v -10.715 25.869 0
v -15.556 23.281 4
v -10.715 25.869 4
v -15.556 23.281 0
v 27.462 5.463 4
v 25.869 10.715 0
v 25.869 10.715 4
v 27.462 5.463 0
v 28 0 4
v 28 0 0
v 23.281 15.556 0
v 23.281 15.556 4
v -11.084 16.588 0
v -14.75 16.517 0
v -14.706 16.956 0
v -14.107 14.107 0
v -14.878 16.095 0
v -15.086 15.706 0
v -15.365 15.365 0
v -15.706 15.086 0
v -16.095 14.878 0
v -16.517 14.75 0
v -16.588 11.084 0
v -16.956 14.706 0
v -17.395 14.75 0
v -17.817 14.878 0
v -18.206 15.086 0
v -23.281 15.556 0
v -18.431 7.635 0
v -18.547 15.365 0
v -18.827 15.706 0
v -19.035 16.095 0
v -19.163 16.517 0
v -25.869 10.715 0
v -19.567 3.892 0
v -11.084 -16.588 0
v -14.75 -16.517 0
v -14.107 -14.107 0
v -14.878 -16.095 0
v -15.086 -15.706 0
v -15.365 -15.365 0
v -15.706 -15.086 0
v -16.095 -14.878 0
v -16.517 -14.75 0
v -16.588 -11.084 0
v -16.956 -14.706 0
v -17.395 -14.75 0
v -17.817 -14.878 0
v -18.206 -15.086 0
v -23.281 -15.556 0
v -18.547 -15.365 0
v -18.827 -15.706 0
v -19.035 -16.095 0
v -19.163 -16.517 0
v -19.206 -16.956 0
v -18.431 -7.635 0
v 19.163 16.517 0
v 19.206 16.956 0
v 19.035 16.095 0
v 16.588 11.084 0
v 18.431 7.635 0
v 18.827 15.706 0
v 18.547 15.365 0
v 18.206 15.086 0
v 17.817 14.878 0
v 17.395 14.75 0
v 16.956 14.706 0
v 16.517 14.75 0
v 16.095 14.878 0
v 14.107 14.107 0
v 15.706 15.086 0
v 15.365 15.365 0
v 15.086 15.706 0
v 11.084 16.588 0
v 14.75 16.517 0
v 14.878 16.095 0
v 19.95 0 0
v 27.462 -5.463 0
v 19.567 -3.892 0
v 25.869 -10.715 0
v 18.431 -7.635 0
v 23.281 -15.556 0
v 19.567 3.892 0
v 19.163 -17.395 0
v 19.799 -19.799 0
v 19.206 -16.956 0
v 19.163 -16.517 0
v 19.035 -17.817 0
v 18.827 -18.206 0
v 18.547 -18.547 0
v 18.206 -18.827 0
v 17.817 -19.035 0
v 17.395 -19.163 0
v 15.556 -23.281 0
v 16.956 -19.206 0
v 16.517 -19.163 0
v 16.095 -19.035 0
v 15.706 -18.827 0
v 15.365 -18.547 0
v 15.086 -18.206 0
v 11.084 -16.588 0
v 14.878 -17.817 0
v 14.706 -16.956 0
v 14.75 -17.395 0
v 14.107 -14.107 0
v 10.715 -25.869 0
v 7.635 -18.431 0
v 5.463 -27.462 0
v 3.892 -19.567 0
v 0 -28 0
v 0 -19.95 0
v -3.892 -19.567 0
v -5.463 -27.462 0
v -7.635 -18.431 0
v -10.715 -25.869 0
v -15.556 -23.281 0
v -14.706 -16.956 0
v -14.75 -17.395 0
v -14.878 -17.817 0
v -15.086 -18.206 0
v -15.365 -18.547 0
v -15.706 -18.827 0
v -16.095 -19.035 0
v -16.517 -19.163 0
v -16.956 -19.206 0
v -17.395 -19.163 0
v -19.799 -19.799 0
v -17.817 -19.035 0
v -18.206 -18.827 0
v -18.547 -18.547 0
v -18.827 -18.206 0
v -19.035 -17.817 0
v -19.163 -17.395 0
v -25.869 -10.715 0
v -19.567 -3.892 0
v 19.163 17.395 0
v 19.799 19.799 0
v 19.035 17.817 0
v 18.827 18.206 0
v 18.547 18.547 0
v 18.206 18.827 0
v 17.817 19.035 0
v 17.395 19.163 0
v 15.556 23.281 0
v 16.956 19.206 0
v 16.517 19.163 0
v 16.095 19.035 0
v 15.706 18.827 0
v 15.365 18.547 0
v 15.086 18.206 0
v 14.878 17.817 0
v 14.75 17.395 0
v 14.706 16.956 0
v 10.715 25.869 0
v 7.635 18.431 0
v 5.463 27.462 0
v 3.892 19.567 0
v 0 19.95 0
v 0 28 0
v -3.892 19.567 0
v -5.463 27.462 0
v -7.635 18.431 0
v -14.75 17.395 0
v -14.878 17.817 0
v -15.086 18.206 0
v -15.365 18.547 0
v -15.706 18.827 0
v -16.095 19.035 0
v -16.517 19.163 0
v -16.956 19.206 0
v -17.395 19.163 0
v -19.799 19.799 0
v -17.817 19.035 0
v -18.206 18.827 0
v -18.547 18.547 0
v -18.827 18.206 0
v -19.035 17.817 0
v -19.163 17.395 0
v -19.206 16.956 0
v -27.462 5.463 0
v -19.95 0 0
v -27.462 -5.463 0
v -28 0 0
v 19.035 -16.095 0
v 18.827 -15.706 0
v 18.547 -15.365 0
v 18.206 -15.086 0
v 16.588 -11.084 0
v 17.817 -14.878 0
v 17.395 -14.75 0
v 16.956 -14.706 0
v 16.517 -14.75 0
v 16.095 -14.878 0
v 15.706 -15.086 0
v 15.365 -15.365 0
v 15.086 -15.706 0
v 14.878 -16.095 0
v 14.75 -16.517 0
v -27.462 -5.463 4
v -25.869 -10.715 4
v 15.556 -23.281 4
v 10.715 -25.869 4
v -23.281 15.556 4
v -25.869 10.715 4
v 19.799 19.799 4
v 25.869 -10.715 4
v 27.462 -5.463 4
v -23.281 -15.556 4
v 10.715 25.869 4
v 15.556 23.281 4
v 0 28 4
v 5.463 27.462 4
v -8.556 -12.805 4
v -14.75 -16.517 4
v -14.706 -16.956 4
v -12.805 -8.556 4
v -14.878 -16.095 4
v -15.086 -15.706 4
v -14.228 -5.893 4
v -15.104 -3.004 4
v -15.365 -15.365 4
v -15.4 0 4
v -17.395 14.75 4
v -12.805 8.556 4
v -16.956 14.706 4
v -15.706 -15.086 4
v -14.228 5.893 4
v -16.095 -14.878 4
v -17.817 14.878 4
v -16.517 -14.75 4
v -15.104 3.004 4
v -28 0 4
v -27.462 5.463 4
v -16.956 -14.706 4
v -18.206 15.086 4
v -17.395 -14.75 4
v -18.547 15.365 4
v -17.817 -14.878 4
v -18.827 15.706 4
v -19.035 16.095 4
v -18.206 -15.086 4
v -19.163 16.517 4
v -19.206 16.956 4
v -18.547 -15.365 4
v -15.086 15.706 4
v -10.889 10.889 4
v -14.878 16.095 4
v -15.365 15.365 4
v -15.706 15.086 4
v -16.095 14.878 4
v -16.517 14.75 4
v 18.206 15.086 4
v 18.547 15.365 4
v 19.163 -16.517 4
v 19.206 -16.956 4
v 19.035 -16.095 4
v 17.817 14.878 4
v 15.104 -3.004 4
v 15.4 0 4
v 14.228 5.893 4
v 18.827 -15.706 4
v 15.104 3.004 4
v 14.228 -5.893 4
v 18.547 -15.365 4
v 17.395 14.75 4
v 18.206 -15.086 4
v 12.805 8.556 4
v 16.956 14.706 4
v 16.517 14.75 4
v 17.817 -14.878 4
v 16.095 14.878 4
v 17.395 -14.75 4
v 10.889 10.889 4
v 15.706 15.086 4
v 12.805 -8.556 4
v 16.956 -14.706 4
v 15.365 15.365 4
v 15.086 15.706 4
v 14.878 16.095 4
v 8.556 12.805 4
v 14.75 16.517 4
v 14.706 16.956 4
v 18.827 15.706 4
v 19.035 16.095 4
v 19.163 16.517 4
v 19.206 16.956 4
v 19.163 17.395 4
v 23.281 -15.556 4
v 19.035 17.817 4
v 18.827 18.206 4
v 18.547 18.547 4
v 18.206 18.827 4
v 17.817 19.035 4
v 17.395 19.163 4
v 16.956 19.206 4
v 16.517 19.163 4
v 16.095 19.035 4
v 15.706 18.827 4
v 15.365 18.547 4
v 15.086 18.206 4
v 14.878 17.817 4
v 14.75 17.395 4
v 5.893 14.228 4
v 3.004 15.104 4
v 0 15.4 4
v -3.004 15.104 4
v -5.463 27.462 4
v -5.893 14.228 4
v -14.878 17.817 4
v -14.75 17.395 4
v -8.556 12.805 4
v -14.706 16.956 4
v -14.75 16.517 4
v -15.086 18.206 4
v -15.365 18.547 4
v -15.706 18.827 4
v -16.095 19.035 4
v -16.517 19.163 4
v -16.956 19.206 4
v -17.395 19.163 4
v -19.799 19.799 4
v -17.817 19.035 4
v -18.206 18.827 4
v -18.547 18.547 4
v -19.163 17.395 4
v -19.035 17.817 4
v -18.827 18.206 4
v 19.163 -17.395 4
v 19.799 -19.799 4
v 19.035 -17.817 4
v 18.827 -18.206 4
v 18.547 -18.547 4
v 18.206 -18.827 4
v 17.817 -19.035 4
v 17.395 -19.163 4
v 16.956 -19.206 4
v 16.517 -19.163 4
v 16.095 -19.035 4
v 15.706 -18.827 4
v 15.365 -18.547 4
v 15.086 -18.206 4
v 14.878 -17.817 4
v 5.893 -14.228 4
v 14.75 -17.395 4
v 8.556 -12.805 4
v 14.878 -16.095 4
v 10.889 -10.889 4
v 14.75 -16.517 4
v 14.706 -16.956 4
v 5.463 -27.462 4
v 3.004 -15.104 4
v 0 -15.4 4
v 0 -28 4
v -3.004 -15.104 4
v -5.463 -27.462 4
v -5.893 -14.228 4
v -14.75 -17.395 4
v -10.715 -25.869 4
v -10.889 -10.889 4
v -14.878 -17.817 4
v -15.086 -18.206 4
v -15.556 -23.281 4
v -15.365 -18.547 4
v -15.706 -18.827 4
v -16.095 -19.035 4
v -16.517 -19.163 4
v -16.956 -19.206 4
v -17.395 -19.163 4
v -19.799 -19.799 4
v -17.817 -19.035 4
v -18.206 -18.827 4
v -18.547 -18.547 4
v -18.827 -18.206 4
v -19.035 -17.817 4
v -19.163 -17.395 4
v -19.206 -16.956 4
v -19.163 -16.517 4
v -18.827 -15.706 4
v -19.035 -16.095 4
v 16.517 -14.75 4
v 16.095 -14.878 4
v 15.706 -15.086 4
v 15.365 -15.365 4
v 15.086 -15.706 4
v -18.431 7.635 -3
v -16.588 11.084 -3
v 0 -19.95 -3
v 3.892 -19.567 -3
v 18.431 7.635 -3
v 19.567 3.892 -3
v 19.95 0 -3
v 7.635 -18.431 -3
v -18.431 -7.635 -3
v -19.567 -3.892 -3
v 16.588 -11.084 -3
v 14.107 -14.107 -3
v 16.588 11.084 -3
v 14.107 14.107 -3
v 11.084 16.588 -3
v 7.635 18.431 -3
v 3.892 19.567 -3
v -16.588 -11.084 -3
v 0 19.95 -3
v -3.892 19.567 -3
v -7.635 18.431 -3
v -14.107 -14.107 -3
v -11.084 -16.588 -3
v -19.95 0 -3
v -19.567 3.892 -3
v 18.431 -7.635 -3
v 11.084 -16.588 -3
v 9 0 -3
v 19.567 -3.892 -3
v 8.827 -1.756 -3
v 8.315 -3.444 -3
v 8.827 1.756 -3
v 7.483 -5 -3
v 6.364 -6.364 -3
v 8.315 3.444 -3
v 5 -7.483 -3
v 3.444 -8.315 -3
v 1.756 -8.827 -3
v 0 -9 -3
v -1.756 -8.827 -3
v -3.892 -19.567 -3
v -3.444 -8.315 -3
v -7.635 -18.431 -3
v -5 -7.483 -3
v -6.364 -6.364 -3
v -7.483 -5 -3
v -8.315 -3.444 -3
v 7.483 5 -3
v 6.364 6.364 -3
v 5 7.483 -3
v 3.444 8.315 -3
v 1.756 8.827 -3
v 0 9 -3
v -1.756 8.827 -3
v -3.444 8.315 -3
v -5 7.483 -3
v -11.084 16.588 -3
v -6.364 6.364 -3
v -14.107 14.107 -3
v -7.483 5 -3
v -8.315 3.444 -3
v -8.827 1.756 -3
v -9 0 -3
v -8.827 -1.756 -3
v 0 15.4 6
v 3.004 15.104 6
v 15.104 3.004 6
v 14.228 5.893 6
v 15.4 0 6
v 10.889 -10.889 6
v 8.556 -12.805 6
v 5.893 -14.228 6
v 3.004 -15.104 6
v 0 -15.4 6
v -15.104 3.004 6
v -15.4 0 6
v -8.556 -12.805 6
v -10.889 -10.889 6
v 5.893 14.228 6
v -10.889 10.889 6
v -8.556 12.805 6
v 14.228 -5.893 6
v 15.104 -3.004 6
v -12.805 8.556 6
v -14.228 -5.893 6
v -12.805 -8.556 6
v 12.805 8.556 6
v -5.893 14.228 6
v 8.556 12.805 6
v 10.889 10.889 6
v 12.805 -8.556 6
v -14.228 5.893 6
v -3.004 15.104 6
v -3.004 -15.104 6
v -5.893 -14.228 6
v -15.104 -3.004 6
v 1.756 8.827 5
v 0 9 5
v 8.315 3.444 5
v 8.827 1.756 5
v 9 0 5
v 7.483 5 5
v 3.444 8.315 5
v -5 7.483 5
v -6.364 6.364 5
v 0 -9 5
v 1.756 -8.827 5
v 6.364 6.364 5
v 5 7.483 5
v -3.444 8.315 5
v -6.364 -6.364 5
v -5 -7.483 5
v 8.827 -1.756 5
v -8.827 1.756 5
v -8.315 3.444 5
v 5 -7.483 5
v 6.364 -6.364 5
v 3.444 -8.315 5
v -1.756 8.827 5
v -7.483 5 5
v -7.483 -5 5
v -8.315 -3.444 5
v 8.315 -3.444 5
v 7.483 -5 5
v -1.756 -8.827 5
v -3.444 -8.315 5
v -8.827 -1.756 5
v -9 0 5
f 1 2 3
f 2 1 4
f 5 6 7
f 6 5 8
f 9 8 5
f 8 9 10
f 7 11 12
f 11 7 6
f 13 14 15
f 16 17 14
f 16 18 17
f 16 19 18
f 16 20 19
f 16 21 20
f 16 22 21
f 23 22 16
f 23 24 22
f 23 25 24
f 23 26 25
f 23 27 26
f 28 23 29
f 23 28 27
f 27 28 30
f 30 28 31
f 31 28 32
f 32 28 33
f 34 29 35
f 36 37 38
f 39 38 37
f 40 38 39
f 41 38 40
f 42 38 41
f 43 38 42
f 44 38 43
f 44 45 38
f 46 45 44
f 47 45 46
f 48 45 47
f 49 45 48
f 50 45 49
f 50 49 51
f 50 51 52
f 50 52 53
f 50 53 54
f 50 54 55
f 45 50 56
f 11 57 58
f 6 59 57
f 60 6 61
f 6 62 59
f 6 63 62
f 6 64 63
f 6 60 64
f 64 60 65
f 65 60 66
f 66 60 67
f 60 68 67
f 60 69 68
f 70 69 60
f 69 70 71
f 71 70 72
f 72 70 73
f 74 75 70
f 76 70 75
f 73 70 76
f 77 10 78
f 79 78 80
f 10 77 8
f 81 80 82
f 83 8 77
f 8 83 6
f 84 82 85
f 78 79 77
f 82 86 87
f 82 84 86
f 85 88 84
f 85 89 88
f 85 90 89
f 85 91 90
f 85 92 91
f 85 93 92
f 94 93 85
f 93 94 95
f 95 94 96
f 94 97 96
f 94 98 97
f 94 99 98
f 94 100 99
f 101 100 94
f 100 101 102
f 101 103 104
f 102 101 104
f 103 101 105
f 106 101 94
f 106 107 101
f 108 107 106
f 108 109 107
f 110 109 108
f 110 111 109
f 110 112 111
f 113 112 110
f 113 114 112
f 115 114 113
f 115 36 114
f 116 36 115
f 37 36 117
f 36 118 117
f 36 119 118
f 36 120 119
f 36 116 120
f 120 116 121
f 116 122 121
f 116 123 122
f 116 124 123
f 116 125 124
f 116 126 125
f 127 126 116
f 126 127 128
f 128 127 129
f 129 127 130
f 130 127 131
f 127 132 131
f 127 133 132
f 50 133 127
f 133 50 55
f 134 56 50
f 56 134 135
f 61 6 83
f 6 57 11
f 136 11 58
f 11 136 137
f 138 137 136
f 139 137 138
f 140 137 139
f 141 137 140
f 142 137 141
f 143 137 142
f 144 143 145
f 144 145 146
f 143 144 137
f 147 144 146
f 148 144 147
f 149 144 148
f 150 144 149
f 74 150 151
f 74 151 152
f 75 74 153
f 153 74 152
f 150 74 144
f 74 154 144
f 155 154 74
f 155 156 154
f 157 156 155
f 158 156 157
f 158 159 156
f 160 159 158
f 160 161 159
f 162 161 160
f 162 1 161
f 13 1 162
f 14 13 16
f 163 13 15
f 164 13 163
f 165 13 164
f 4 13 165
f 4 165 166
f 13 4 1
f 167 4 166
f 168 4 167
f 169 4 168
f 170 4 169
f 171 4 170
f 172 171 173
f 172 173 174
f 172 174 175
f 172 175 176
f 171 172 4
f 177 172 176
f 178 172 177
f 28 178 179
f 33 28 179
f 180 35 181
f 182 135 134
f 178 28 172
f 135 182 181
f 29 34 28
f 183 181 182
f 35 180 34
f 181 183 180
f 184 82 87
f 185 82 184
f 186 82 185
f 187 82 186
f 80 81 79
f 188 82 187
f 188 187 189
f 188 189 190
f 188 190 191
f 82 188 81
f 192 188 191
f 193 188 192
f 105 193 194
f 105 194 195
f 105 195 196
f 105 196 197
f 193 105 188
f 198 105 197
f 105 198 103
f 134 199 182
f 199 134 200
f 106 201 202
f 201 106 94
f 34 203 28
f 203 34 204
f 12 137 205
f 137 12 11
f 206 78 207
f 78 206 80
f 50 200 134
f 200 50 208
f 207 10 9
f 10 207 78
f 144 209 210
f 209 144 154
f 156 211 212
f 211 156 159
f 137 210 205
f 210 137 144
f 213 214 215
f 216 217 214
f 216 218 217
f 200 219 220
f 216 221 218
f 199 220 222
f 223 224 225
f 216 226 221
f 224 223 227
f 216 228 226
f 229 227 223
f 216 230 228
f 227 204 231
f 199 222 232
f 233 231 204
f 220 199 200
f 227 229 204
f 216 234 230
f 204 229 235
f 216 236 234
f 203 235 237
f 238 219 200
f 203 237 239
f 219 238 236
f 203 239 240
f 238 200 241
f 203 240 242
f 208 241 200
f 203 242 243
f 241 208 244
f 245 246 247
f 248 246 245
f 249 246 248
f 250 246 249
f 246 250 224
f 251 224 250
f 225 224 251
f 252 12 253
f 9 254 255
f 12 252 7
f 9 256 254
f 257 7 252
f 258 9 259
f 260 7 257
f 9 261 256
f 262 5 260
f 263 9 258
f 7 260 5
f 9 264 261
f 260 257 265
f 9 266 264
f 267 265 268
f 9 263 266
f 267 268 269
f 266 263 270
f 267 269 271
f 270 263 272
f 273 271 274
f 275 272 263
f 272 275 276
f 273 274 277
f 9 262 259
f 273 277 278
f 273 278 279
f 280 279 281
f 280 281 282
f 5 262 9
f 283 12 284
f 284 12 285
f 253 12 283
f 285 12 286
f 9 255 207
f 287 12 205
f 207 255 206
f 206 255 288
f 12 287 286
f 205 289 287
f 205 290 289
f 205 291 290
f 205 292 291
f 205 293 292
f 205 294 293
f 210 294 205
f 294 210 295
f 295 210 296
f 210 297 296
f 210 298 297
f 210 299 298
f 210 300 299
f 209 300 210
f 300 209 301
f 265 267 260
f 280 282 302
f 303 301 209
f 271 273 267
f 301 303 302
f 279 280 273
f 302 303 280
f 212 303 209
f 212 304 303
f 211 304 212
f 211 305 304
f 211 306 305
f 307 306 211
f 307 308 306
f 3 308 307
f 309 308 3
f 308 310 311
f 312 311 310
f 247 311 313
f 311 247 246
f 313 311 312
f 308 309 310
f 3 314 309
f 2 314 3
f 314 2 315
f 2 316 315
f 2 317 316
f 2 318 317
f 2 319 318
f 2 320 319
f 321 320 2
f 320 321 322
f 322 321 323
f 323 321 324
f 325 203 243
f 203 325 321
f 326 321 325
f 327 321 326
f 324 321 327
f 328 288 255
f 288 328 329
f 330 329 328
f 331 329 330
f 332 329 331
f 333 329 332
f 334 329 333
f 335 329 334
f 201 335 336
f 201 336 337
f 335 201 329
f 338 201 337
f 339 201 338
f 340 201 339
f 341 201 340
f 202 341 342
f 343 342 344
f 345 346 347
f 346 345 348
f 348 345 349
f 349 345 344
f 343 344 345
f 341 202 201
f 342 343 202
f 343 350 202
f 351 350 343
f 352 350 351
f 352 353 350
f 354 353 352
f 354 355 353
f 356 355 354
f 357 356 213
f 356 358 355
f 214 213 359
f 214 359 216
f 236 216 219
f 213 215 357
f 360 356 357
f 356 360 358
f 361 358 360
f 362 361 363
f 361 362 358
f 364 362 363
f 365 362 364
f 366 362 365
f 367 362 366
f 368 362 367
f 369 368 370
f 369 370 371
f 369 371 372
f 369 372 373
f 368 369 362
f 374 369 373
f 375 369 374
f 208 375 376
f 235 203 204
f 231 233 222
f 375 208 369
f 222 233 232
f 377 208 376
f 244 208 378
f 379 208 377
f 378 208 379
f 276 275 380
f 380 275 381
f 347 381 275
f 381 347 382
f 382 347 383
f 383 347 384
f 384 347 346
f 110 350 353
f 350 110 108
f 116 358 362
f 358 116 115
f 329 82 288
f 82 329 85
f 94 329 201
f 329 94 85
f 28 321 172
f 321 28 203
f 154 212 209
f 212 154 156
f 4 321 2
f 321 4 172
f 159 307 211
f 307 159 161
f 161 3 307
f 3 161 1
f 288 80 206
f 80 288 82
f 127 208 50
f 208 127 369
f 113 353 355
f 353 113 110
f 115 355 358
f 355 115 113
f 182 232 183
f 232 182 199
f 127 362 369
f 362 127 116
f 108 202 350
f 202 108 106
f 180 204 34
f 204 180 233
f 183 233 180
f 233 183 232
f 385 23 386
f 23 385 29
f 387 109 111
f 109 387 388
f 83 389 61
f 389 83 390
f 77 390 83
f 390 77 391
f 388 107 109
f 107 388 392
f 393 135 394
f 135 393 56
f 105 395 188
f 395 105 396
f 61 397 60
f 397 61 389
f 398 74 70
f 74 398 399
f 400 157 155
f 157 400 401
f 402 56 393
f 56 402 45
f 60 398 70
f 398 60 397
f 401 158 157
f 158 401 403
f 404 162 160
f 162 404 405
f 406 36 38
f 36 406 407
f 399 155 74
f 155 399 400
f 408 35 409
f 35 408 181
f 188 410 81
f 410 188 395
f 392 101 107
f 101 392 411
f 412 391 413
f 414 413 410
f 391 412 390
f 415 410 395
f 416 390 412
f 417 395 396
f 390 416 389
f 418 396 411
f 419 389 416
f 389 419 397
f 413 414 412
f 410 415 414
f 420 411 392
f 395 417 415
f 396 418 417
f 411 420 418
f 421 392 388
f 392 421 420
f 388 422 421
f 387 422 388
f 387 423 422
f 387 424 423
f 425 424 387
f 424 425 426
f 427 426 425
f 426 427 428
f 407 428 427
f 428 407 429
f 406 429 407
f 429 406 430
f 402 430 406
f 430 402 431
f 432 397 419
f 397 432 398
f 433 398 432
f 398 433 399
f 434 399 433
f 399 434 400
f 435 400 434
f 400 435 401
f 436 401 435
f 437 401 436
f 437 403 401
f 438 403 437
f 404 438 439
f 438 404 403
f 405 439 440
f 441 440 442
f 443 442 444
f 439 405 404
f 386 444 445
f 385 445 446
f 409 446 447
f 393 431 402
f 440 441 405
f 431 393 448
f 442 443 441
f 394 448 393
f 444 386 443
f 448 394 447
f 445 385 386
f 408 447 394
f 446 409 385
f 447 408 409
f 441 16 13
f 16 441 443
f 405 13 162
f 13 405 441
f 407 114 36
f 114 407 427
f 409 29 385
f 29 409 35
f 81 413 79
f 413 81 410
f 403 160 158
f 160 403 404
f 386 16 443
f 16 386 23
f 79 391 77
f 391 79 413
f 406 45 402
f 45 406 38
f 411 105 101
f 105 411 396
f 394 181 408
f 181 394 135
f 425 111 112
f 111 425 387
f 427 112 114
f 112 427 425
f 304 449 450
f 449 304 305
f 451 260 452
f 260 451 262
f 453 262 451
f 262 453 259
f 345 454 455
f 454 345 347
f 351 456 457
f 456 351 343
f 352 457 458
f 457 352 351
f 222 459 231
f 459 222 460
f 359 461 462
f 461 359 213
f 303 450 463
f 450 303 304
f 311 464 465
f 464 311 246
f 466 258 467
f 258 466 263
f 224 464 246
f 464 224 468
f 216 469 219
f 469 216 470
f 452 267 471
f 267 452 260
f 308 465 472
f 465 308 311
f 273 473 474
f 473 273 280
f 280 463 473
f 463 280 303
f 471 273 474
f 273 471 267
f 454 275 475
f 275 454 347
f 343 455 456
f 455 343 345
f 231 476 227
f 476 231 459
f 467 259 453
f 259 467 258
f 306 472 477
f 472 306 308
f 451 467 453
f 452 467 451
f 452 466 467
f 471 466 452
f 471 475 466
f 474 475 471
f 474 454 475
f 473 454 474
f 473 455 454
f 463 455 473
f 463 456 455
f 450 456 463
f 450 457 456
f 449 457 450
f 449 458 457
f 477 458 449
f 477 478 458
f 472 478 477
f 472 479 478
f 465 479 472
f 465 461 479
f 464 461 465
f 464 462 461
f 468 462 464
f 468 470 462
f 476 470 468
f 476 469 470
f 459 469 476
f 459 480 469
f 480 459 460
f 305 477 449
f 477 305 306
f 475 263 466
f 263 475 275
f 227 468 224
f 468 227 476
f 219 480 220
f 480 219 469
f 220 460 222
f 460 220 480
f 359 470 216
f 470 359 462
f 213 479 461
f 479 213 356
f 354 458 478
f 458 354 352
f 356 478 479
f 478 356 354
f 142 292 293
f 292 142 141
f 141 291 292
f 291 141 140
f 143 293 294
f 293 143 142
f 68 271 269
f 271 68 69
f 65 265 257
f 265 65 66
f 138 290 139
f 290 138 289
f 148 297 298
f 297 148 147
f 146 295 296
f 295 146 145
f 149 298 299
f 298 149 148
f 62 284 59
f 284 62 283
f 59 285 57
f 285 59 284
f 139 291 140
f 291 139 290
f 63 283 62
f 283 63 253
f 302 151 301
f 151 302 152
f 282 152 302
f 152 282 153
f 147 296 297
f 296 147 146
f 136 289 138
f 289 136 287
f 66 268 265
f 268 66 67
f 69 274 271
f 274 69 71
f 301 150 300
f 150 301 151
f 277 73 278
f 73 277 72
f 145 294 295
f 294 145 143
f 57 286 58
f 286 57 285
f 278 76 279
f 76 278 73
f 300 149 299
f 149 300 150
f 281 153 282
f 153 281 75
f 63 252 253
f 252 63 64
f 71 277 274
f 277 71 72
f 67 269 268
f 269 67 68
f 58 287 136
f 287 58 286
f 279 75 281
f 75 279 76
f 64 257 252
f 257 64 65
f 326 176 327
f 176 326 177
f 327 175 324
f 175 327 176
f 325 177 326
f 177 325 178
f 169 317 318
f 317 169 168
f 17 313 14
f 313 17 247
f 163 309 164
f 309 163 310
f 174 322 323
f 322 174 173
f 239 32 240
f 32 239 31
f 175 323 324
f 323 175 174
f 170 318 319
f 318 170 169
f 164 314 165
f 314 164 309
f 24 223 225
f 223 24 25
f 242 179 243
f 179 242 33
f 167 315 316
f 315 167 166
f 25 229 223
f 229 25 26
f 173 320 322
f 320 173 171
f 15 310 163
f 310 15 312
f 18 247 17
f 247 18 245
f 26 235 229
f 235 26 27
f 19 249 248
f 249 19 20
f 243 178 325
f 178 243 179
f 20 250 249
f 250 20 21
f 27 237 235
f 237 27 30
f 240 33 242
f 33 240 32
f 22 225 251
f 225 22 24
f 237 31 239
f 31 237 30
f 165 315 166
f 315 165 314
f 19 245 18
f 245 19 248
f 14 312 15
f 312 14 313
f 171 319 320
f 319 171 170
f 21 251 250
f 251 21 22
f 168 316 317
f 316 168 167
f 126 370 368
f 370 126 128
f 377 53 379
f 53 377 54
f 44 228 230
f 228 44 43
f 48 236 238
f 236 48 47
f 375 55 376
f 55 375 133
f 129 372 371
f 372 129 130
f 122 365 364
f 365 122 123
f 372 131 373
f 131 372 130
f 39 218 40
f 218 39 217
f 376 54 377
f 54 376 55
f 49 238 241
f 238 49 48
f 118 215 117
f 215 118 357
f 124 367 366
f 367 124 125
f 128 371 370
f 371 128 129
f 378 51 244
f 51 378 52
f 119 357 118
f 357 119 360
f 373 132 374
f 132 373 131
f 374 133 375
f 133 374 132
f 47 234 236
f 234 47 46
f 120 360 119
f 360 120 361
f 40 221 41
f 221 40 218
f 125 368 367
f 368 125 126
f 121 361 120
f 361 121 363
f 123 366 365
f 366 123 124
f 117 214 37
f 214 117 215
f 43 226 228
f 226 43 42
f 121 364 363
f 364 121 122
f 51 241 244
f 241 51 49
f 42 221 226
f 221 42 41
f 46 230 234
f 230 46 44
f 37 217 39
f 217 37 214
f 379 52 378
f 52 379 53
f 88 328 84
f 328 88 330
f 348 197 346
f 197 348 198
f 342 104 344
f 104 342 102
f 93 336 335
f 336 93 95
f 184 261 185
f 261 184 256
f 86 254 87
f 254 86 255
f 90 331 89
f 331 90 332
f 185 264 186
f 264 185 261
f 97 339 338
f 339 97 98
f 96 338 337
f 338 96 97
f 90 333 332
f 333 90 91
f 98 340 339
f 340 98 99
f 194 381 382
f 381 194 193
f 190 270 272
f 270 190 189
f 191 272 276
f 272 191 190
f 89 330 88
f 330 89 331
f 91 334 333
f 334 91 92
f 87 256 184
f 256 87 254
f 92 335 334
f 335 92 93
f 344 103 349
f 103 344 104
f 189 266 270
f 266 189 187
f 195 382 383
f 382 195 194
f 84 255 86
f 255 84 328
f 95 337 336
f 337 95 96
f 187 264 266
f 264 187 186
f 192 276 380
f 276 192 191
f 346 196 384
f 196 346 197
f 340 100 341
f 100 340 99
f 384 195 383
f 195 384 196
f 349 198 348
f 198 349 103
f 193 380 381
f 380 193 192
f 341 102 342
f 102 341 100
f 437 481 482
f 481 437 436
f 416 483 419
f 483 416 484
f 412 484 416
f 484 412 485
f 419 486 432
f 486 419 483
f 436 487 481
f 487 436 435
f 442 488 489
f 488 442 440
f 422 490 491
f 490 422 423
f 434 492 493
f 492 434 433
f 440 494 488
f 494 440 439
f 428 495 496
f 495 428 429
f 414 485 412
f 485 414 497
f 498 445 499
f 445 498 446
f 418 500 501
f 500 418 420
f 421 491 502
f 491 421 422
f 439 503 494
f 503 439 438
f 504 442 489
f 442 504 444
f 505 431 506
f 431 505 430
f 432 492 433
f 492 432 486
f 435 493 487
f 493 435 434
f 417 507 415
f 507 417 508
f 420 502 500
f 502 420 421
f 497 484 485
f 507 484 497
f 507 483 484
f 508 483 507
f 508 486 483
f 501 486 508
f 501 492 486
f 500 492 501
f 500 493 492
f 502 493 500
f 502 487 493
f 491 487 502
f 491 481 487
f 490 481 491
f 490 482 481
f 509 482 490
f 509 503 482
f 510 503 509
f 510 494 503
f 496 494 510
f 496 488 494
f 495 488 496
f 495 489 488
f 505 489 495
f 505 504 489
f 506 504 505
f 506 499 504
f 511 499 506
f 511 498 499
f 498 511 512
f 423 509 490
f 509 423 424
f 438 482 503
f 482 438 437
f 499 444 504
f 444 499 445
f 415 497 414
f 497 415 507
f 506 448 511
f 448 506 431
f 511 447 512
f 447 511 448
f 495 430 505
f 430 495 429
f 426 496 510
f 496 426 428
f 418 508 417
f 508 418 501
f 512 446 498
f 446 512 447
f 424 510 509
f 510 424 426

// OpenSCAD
$fn = 32;

// ----------------------------------------------------------------------
// Retaining cap: 6203 cover, 56 mm, spigot 39.9 mm
// ----------------------------------------------------------------------

// --- parameters (mm) ---
plate_d = 56;             // cover diameter
plate_t = 4;              // cover thickness
boss_d = 39.9;            // spigot that enters the housing
boss_h = 3;               // spigot height
shaft_d = 18;             // shaft opening
bolt_d = 4.5;             // bolt clearance
bolt_r = 23.98;           // bolt circle radius
dome_h = 2;               // raised centre

module cover() {
  cylinder(h = plate_t, d = plate_d);
}

module spigot() {
  /* sunk 1 mm into the cover; the spigot sets the overall height */
  translate([0, 0, -boss_h]) cylinder(h = boss_h + 1, d = boss_d);
}

module dome() {
  translate([0, 0, plate_t - 1]) cylinder(h = dome_h + 1, d = plate_d * 0.55);
}

difference() {
  union() {
    cover();
    spigot();
    dome();
  }
  for (i = [0 : 3]) rotate([0, 0, 45 + i * 90]) translate([bolt_r, 0, -boss_h - 1])
    cylinder(h = boss_h + plate_t + 2, d = bolt_d);
  translate([0, 0, -boss_h - 1]) cylinder(h = boss_h + plate_t + 2, d = shaft_d);
}
